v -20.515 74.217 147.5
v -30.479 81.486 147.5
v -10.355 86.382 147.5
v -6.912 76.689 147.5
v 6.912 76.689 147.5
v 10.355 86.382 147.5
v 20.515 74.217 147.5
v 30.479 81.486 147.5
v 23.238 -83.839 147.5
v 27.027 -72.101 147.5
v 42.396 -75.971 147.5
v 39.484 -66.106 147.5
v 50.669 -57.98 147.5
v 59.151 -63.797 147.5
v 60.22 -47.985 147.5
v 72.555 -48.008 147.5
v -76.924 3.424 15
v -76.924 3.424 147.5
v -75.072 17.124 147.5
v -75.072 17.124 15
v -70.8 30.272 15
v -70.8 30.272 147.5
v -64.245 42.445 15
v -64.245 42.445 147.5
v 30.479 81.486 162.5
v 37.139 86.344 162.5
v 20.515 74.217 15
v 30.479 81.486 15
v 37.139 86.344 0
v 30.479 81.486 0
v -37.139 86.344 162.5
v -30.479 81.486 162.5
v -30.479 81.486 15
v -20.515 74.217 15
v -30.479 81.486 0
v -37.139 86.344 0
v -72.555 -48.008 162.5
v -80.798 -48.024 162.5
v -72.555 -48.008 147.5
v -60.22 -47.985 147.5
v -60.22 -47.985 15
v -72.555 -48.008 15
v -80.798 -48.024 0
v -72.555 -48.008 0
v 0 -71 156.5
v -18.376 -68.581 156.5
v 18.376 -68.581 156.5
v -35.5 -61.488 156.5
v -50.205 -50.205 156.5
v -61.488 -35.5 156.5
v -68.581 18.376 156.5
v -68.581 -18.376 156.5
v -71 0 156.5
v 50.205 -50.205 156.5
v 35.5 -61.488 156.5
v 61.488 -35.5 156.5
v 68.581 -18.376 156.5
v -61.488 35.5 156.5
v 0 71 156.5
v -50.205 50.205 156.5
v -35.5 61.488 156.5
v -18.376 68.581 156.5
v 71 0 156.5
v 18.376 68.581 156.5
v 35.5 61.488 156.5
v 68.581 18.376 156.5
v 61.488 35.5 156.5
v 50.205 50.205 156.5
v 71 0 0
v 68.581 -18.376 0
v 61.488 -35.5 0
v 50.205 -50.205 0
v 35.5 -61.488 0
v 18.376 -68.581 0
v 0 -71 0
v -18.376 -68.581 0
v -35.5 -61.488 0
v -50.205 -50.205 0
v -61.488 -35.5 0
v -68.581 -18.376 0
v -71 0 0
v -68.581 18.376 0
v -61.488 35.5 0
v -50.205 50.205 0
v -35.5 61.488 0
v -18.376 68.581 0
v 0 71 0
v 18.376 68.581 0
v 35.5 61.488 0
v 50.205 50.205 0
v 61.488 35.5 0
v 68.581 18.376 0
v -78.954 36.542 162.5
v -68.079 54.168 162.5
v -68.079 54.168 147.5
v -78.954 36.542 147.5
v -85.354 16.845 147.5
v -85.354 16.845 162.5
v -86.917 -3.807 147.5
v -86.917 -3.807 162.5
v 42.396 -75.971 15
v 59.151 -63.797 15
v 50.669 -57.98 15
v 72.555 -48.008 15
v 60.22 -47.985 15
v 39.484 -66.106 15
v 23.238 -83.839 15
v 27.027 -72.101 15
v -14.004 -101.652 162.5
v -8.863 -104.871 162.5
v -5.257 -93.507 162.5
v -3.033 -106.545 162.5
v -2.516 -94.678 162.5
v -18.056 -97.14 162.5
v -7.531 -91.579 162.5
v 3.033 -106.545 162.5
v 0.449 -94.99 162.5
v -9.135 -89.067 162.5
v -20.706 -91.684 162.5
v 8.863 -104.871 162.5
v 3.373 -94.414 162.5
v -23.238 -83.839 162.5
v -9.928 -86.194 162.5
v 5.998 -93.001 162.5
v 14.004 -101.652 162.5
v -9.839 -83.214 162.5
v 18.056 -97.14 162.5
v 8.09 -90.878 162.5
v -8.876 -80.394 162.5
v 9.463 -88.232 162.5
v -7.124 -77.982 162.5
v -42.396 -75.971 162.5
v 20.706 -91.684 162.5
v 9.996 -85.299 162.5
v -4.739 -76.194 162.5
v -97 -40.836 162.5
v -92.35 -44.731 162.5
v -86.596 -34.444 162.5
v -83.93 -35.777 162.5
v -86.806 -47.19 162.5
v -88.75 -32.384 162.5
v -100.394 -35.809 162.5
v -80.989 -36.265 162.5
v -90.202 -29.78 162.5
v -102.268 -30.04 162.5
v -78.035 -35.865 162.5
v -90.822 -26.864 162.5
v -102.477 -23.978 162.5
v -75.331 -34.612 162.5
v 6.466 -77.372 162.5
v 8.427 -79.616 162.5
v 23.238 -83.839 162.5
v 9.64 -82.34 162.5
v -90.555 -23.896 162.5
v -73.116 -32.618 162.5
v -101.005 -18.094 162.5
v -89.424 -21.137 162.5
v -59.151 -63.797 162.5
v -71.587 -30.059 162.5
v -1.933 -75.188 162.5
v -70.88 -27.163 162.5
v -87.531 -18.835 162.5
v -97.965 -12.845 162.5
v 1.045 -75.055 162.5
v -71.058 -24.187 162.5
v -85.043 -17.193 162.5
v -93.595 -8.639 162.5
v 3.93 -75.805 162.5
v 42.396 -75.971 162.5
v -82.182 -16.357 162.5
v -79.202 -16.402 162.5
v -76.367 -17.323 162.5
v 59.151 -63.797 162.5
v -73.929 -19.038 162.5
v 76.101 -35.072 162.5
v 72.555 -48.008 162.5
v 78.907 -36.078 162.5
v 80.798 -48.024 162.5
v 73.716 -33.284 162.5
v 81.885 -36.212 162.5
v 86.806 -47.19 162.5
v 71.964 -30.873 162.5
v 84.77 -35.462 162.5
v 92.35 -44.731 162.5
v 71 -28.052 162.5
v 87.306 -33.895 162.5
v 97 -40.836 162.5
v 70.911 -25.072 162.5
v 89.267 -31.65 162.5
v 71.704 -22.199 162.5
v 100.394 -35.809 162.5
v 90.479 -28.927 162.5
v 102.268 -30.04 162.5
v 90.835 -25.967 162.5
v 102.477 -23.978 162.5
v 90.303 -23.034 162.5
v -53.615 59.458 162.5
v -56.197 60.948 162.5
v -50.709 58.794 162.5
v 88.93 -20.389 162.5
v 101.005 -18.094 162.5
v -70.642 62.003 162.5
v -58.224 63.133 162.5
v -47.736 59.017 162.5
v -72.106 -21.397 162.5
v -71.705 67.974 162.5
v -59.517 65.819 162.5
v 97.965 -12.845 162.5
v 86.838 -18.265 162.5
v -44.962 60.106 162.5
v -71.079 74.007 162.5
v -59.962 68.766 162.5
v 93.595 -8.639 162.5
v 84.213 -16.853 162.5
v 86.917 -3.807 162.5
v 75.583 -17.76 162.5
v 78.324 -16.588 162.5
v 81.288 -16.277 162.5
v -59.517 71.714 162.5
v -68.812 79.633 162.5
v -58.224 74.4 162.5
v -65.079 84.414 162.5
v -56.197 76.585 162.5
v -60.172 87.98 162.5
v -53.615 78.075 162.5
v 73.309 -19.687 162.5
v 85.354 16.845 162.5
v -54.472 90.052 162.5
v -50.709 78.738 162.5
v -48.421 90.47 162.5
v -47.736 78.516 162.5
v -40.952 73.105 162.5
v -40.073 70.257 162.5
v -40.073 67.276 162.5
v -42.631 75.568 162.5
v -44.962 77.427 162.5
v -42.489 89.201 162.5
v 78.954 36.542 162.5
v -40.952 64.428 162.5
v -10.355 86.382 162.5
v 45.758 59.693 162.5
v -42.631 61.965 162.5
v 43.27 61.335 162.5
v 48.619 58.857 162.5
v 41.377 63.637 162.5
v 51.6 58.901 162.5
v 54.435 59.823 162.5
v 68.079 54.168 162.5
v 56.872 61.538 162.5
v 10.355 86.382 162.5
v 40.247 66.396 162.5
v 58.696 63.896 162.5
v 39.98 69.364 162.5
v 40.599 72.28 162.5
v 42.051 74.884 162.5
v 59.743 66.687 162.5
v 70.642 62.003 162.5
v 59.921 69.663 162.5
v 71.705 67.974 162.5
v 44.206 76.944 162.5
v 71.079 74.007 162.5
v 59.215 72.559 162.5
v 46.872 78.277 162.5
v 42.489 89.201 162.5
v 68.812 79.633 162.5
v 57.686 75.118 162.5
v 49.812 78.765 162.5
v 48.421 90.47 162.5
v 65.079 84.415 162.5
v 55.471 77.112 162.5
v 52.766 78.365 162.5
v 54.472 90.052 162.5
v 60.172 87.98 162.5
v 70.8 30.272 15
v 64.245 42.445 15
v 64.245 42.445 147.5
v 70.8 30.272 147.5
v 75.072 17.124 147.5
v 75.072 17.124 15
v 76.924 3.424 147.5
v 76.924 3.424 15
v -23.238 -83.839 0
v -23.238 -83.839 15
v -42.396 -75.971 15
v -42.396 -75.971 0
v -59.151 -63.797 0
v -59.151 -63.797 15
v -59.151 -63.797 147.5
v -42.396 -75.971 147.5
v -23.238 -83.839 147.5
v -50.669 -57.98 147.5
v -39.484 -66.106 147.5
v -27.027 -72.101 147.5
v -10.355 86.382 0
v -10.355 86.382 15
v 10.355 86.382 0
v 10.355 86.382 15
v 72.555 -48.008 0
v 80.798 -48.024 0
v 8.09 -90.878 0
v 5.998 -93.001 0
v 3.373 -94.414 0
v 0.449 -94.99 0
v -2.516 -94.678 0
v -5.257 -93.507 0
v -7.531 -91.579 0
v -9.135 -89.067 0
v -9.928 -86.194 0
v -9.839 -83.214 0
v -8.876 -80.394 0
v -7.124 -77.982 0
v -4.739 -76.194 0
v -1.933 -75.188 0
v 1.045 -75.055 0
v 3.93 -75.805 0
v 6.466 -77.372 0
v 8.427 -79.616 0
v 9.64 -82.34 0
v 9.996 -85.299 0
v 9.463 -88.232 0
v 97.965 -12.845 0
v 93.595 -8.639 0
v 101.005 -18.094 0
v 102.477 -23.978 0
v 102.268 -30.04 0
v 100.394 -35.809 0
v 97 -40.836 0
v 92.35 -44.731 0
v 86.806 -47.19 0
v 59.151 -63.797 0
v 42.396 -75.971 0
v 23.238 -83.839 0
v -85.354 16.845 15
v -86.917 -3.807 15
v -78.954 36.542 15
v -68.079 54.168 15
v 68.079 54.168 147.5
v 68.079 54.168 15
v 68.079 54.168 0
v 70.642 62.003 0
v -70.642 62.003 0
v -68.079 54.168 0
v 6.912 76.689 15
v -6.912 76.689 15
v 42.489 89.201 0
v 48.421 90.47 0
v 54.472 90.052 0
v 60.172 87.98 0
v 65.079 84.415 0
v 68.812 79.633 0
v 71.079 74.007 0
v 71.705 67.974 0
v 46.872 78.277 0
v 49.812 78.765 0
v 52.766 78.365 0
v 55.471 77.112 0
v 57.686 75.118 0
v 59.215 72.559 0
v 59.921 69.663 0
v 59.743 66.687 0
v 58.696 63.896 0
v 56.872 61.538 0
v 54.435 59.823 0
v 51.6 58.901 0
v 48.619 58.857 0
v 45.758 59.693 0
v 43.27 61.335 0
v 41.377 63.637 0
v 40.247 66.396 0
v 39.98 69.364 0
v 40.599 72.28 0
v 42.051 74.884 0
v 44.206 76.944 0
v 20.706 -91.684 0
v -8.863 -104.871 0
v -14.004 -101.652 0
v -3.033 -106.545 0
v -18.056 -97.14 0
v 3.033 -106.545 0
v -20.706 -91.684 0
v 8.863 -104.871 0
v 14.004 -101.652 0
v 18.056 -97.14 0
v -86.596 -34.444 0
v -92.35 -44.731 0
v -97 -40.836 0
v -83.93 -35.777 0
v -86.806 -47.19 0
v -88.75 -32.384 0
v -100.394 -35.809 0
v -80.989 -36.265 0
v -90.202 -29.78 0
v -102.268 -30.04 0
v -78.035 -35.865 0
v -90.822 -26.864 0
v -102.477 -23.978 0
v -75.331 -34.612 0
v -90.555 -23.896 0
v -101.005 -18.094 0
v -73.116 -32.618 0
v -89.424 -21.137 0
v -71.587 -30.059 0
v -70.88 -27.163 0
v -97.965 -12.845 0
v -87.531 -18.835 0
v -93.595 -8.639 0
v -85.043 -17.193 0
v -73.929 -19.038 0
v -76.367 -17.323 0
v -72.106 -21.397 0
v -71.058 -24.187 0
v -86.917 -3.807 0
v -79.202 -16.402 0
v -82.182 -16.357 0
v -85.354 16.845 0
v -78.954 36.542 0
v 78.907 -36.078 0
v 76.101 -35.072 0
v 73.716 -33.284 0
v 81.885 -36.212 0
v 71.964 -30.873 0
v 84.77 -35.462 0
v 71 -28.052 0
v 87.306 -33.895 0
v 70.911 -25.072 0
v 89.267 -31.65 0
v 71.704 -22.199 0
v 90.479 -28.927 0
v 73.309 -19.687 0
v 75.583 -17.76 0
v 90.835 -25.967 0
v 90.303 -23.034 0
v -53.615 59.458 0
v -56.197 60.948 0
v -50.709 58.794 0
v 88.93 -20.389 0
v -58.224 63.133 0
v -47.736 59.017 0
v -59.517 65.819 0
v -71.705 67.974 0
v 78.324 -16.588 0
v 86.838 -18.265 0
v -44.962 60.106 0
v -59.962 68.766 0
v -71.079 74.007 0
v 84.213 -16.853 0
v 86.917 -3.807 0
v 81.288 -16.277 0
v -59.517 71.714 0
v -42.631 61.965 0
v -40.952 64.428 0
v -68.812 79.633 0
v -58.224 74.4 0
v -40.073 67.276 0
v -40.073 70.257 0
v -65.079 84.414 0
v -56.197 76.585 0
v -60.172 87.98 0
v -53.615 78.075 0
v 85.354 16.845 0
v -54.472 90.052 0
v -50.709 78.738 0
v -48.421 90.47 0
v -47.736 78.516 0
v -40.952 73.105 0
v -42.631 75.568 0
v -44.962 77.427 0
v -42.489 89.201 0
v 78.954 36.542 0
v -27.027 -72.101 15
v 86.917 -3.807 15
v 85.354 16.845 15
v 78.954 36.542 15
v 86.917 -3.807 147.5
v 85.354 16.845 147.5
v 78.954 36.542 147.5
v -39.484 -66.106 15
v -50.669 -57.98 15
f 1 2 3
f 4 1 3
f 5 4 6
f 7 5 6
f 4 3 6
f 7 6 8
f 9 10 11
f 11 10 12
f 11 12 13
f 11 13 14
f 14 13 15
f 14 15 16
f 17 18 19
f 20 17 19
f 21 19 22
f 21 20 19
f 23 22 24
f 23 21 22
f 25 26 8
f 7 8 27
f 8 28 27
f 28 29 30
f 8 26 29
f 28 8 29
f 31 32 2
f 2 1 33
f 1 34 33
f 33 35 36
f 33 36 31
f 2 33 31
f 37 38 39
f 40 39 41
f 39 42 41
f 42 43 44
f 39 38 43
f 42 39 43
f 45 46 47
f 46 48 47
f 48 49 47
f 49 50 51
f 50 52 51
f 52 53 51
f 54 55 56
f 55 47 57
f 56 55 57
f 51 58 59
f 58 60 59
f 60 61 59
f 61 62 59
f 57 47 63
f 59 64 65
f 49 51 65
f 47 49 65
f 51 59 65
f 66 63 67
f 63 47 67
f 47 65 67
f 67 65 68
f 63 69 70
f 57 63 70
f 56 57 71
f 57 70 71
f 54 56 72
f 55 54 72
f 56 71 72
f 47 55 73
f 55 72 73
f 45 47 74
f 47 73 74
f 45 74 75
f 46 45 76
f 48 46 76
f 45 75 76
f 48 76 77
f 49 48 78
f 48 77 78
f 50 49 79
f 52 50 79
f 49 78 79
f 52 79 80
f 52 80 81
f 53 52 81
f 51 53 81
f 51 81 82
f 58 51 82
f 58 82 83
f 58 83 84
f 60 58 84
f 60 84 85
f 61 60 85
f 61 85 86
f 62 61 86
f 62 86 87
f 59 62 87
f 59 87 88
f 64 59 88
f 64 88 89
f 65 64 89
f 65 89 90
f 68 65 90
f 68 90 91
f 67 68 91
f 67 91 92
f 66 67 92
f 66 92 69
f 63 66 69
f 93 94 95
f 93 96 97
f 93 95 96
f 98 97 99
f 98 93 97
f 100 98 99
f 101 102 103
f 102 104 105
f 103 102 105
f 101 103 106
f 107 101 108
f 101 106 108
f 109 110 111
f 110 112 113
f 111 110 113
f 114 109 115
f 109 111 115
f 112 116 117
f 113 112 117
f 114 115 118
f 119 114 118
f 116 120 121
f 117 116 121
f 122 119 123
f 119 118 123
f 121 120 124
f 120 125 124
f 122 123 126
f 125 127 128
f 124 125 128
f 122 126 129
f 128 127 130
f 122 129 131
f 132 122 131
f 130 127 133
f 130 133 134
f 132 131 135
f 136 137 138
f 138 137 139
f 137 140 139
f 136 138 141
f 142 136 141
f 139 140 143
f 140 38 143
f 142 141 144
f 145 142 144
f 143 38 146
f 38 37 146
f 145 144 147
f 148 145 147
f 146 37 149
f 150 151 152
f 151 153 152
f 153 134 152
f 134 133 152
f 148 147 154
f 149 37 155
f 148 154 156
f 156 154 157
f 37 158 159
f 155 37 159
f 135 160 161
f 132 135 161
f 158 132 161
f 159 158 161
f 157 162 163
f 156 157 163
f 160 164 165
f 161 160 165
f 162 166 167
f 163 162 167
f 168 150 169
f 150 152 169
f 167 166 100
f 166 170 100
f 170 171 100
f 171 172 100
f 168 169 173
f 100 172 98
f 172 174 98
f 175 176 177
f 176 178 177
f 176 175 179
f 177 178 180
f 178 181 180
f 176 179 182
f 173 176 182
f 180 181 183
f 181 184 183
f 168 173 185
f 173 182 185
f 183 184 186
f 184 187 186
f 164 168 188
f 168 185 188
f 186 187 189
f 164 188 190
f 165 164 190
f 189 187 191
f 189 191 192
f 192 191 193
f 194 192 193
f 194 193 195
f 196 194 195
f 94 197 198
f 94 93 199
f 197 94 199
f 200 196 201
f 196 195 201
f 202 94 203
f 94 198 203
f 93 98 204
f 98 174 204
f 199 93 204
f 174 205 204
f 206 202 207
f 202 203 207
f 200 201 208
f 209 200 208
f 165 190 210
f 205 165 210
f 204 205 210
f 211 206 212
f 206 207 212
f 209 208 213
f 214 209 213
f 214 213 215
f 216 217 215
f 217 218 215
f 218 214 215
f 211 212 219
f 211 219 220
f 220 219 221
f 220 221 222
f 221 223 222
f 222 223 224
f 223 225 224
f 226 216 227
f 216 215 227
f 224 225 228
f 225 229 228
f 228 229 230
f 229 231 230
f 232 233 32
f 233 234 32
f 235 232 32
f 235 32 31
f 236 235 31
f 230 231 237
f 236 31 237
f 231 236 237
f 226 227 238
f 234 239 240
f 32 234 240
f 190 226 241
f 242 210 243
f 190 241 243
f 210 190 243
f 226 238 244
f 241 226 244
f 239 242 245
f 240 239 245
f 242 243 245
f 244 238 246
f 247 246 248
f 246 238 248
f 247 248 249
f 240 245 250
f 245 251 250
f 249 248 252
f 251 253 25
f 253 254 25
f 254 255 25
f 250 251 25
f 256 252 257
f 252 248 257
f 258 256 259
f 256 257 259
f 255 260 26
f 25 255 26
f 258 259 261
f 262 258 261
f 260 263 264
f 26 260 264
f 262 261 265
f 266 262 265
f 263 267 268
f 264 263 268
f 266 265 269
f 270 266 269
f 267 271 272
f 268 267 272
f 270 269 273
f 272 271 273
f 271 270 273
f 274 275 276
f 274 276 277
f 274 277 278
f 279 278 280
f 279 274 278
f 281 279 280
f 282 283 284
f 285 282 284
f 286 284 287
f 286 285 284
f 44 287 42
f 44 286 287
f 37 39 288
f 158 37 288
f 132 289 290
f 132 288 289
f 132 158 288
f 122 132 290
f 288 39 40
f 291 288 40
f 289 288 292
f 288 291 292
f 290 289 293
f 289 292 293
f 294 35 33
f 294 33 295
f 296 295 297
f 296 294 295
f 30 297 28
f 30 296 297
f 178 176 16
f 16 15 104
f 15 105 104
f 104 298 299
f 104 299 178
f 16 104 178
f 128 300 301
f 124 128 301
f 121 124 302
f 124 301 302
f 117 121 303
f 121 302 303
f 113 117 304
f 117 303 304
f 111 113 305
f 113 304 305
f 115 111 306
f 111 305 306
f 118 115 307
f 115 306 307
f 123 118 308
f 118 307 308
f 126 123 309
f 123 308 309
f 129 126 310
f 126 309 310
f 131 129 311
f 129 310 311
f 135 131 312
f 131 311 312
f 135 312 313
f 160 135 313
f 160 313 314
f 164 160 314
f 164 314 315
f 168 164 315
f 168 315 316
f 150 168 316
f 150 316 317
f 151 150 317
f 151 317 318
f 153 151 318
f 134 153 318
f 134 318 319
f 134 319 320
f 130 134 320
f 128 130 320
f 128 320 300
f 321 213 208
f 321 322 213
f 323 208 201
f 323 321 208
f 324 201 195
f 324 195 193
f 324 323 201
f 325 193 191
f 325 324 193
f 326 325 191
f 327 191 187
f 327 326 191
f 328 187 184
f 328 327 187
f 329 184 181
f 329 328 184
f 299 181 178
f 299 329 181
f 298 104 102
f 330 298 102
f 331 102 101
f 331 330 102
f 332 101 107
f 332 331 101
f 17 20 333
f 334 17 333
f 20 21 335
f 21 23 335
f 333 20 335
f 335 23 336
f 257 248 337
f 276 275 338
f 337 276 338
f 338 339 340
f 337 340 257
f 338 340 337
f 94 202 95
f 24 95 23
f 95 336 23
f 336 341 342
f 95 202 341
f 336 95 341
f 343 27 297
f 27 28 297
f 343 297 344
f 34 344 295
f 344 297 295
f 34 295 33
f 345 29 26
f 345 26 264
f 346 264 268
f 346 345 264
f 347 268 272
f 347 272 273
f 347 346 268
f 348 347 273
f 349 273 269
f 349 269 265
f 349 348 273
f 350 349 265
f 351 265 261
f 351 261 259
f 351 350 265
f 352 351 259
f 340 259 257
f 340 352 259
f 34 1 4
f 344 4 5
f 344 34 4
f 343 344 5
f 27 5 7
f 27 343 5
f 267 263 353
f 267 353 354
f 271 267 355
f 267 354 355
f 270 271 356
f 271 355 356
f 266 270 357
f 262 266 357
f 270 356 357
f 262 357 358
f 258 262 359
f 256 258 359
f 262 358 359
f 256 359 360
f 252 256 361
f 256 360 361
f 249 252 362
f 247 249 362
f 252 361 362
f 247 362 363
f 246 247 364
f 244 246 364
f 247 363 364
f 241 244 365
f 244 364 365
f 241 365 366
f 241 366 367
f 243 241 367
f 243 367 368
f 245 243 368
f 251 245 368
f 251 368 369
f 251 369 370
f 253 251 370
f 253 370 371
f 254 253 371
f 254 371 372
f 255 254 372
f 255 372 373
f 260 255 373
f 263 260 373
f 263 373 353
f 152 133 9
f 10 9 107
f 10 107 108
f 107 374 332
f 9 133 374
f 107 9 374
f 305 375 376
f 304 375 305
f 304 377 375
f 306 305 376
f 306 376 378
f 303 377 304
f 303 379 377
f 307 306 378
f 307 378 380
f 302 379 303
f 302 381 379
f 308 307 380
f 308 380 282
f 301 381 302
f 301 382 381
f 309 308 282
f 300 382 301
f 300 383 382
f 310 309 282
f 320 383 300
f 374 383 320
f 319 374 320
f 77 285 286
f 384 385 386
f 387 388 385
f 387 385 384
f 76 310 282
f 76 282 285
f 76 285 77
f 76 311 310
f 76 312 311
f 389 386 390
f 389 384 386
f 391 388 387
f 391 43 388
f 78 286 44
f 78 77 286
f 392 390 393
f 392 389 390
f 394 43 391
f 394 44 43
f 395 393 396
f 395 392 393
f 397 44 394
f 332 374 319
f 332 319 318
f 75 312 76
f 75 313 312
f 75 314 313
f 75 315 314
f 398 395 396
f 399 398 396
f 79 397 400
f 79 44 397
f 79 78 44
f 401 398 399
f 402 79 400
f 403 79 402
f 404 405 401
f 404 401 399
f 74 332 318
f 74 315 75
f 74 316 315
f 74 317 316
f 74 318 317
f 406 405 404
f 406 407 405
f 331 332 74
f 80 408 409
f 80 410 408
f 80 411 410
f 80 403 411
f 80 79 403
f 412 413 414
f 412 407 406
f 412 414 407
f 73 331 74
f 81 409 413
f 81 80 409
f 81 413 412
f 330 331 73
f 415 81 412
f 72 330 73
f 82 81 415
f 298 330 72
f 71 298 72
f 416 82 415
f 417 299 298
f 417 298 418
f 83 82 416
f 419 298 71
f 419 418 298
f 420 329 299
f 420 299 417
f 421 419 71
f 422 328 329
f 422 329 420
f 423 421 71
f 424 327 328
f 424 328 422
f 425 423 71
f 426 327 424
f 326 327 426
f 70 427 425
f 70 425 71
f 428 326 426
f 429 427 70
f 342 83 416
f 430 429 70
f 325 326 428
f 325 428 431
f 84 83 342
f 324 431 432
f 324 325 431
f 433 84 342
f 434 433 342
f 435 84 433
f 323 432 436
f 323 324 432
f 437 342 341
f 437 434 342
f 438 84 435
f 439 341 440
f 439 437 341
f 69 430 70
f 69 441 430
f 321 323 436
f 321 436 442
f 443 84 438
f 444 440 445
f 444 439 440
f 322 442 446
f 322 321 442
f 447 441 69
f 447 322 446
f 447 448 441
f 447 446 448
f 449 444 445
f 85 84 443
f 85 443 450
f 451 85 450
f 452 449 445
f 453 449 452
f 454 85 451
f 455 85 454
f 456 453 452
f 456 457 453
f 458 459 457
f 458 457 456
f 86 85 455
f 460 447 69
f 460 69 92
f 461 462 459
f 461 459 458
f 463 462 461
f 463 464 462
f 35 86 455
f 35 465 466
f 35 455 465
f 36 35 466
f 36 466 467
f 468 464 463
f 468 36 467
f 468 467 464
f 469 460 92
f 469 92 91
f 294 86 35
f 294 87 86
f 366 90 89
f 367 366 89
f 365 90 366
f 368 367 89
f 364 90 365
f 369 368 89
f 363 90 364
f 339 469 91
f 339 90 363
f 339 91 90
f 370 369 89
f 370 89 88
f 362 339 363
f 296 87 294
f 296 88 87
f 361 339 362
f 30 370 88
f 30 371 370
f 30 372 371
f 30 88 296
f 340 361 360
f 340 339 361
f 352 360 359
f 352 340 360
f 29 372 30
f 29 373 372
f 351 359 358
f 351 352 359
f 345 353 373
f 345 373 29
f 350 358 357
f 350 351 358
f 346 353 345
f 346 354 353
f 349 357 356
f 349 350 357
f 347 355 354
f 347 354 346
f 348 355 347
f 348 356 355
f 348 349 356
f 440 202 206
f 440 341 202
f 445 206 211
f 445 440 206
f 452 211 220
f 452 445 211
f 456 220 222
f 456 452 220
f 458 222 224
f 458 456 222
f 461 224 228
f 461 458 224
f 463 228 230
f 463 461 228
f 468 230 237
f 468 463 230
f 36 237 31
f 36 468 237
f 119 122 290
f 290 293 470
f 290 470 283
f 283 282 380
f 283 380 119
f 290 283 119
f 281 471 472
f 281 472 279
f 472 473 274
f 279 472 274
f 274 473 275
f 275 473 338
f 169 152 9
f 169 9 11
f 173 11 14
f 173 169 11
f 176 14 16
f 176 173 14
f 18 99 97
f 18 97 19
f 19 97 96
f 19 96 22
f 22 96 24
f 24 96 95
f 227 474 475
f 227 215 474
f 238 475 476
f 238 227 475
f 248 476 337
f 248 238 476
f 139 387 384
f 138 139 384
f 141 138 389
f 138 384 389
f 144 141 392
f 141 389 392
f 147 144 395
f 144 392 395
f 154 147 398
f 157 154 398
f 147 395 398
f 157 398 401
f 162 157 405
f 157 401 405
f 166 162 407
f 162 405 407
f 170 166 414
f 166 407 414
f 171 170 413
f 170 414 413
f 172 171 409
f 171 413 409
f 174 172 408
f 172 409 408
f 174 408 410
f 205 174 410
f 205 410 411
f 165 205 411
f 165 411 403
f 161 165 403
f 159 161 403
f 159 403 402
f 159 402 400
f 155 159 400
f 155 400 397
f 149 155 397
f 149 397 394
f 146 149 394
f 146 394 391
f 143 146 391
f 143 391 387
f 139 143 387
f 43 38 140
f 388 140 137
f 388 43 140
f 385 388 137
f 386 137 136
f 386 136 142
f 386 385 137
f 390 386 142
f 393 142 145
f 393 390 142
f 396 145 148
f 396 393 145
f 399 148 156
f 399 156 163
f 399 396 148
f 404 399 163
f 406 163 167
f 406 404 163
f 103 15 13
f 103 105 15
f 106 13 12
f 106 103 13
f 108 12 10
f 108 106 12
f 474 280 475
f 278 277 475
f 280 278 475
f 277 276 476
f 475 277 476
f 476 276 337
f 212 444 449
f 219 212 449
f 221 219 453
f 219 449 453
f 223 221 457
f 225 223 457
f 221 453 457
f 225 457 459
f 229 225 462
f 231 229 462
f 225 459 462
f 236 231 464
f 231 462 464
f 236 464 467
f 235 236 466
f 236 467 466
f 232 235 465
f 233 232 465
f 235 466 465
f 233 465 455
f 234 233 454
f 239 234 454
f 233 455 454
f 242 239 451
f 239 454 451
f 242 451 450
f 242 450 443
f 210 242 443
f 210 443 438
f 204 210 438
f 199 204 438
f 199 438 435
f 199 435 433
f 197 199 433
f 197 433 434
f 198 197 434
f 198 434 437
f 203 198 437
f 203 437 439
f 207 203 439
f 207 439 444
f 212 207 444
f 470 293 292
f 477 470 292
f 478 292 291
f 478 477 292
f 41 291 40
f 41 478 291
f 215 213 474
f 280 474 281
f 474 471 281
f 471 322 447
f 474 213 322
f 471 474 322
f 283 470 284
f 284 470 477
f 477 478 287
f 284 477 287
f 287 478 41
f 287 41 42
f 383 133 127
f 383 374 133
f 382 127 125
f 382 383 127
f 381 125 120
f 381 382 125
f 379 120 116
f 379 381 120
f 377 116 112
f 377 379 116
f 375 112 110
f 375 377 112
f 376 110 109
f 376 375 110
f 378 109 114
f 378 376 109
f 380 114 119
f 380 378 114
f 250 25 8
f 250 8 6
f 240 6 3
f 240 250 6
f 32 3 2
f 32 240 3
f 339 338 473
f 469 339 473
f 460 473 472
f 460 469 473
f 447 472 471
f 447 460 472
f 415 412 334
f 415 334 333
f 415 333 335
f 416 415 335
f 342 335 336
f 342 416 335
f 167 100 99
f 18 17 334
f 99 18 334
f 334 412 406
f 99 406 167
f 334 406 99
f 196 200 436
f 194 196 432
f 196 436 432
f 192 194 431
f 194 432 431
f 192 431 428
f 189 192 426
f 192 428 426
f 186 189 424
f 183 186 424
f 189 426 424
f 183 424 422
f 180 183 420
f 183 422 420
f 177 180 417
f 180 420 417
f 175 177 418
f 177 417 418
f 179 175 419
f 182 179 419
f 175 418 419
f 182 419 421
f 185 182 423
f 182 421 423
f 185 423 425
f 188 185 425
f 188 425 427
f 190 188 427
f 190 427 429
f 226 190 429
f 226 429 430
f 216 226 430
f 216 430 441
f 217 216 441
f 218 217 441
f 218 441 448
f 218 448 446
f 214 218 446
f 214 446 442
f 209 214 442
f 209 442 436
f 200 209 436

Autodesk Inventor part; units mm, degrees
ref_plane "YZ Plane" through (0, 0, 0) normal (1, 0, 0) x (0, 1, 0)
ref_plane "XZ Plane" through (0, 0, 0) normal (0, 1, 0) x (-1, 0, 0)
ref_plane "XY Plane" through (0, 0, 0) normal (0, 0, 1) x (1, 0, 0)
sketch "Sketch1" plane through (0, 0, 0) normal (0, 0, 1) x (1, 0, 0)
  circle A0 centre (0, 0) radius 77
  dimension "d0" = 154
extrude "Extrusion1" add sketch "Sketch1" along normal blind 162.5
shell "Shell1" thickness 6 removed faces 1 at (-19.0407, -8.1278, 0)
sketch "Sketch2" plane through (0, 0, 162.5) normal (0, 0, 1) x (1, 0, 0)
  circle A0 centre (0, 0) radius 87
  circle A1 centre (0, 0) radius 77
  dimension "d4" = 174
  dimension "d5" = 154
extrude "Extrusion2" add sketch "Sketch2" against normal blind 15
sketch "Sketch3" plane through (0, 0, 0) normal (0, 0, -1) x (-1, 0, 0)
  circle A0 centre (0, 0) radius 77 projected
  circle A1 centre (0, 0) radius 87 projected
extrude "Extrusion3" add sketch "Sketch3" against normal blind 15
sketch "Sketch4" plane through (0, 0, 0) normal (0, 0, -1) x (-1, 0, 0)
  arc A0 (70.6417, 62.0029) -> (37.1388, 86.3442) centre (49.9617, 68.7664) ccw
  line L0 (45.2595, 62.2943) -> (49.9617, 68.7664) construction
  line L1 (0, 77) -> (0, 87) construction
  line L2 (70.6417, 62.0029) -> (64.2451, 42.4448)
  arc A1 (68.0794, 54.1683) -> (30.4794, 81.4862) centre (0, 0) ccw construction
  arc A2 (68.0794, 54.1683) -> (30.4794, 81.4862) centre (0, 0) ccw construction
  circle A3 centre (0, 0) radius 77 construction
  circle A4 centre (0, 0) radius 77 construction
  arc A5 (64.2451, 42.4448) -> (-30.3958, 70.7467) centre (0, 0) ccw construction
  arc A6 (64.2451, 42.4448) -> (20.5146, 74.2169) centre (0, 0) ccw
  line L3 (20.5146, 74.2169) -> (37.1388, 86.3442)
  line L4 (76.9238, 3.4237) -> (93.5948, -8.6392)
  arc A7 (80.7978, -48.0243) -> (93.5948, -8.6392) centre (80.8398, -26.2664) ccw
  line L5 (80.7978, -48.0243) -> (60.2203, -47.9846)
  arc A8 (60.2203, -47.9846) -> (57.8913, 50.77) centre (0, 0) ccw construction
  line L6 (27.0269, -72.1009) -> (20.706, -91.6836)
  arc A9 (-20.706, -91.6836) -> (20.706, -91.6836) centre (0, -85) ccw
  line L7 (-20.706, -91.6836) -> (-27.0269, -72.1009)
  arc A10 (-27.0269, -72.1009) -> (66.1746, -39.3691) centre (0, 0) ccw construction
  line L8 (-60.2203, -47.9846) -> (-80.7978, -48.0243)
  arc A11 (-93.5948, -8.6392) -> (-80.7978, -48.0243) centre (-80.8398, -26.2664) ccw
  line L9 (-93.5948, -8.6392) -> (-76.9238, 3.4237)
  arc A12 (-76.9238, 3.4237) -> (-16.9932, -75.1015) centre (0, 0) ccw construction
  line L10 (-64.2451, 42.4448) -> (-70.6417, 62.0029)
  arc A13 (-37.1388, 86.3442) -> (-70.6417, 62.0029) centre (-49.9617, 68.7664) ccw
  line L11 (-37.1388, 86.3442) -> (-20.5146, 74.2169)
  arc A14 (-20.5146, 74.2169) -> (-76.6769, -7.0462) centre (0, 0) ccw construction
  point P0 (72.5548, -48.0084)
  point P1 (-23.2381, -83.8391)
  point P2 (-86.9167, -3.807)
  point P3 (-30.4794, 81.4862)
  dimension "d11" = 85
  dimension "d12" = 36
  dimension "d17" = 360
extrude "Extrusion4" add sketch "Sketch4" against normal blind 162.5
pattern_circular "Circular Pattern1" count 5 over 360 about axis through (0, 0, 0) along (0, 0, 1) of "Extrusion4"
sketch "Sketch5" plane through (0, 0, 0) normal (0, 0, -1) x (-1, 0, 0)
  arc A0 (70.6417, 62.0029) -> (37.1388, 86.3442) centre (49.9617, 68.7664) ccw construction
  circle A1 centre (49.9617, 68.7664) radius 10
  point P0 (0, 0)
  dimension "d22" = 20
extrude "Extrusion5" cut sketch "Sketch5" against normal up to next
pattern_circular "Circular Pattern2" count 5 over 360 about axis through (0, 0, 0) along (0, 0, 1) of "Extrusion5"
properties part number "inner"
